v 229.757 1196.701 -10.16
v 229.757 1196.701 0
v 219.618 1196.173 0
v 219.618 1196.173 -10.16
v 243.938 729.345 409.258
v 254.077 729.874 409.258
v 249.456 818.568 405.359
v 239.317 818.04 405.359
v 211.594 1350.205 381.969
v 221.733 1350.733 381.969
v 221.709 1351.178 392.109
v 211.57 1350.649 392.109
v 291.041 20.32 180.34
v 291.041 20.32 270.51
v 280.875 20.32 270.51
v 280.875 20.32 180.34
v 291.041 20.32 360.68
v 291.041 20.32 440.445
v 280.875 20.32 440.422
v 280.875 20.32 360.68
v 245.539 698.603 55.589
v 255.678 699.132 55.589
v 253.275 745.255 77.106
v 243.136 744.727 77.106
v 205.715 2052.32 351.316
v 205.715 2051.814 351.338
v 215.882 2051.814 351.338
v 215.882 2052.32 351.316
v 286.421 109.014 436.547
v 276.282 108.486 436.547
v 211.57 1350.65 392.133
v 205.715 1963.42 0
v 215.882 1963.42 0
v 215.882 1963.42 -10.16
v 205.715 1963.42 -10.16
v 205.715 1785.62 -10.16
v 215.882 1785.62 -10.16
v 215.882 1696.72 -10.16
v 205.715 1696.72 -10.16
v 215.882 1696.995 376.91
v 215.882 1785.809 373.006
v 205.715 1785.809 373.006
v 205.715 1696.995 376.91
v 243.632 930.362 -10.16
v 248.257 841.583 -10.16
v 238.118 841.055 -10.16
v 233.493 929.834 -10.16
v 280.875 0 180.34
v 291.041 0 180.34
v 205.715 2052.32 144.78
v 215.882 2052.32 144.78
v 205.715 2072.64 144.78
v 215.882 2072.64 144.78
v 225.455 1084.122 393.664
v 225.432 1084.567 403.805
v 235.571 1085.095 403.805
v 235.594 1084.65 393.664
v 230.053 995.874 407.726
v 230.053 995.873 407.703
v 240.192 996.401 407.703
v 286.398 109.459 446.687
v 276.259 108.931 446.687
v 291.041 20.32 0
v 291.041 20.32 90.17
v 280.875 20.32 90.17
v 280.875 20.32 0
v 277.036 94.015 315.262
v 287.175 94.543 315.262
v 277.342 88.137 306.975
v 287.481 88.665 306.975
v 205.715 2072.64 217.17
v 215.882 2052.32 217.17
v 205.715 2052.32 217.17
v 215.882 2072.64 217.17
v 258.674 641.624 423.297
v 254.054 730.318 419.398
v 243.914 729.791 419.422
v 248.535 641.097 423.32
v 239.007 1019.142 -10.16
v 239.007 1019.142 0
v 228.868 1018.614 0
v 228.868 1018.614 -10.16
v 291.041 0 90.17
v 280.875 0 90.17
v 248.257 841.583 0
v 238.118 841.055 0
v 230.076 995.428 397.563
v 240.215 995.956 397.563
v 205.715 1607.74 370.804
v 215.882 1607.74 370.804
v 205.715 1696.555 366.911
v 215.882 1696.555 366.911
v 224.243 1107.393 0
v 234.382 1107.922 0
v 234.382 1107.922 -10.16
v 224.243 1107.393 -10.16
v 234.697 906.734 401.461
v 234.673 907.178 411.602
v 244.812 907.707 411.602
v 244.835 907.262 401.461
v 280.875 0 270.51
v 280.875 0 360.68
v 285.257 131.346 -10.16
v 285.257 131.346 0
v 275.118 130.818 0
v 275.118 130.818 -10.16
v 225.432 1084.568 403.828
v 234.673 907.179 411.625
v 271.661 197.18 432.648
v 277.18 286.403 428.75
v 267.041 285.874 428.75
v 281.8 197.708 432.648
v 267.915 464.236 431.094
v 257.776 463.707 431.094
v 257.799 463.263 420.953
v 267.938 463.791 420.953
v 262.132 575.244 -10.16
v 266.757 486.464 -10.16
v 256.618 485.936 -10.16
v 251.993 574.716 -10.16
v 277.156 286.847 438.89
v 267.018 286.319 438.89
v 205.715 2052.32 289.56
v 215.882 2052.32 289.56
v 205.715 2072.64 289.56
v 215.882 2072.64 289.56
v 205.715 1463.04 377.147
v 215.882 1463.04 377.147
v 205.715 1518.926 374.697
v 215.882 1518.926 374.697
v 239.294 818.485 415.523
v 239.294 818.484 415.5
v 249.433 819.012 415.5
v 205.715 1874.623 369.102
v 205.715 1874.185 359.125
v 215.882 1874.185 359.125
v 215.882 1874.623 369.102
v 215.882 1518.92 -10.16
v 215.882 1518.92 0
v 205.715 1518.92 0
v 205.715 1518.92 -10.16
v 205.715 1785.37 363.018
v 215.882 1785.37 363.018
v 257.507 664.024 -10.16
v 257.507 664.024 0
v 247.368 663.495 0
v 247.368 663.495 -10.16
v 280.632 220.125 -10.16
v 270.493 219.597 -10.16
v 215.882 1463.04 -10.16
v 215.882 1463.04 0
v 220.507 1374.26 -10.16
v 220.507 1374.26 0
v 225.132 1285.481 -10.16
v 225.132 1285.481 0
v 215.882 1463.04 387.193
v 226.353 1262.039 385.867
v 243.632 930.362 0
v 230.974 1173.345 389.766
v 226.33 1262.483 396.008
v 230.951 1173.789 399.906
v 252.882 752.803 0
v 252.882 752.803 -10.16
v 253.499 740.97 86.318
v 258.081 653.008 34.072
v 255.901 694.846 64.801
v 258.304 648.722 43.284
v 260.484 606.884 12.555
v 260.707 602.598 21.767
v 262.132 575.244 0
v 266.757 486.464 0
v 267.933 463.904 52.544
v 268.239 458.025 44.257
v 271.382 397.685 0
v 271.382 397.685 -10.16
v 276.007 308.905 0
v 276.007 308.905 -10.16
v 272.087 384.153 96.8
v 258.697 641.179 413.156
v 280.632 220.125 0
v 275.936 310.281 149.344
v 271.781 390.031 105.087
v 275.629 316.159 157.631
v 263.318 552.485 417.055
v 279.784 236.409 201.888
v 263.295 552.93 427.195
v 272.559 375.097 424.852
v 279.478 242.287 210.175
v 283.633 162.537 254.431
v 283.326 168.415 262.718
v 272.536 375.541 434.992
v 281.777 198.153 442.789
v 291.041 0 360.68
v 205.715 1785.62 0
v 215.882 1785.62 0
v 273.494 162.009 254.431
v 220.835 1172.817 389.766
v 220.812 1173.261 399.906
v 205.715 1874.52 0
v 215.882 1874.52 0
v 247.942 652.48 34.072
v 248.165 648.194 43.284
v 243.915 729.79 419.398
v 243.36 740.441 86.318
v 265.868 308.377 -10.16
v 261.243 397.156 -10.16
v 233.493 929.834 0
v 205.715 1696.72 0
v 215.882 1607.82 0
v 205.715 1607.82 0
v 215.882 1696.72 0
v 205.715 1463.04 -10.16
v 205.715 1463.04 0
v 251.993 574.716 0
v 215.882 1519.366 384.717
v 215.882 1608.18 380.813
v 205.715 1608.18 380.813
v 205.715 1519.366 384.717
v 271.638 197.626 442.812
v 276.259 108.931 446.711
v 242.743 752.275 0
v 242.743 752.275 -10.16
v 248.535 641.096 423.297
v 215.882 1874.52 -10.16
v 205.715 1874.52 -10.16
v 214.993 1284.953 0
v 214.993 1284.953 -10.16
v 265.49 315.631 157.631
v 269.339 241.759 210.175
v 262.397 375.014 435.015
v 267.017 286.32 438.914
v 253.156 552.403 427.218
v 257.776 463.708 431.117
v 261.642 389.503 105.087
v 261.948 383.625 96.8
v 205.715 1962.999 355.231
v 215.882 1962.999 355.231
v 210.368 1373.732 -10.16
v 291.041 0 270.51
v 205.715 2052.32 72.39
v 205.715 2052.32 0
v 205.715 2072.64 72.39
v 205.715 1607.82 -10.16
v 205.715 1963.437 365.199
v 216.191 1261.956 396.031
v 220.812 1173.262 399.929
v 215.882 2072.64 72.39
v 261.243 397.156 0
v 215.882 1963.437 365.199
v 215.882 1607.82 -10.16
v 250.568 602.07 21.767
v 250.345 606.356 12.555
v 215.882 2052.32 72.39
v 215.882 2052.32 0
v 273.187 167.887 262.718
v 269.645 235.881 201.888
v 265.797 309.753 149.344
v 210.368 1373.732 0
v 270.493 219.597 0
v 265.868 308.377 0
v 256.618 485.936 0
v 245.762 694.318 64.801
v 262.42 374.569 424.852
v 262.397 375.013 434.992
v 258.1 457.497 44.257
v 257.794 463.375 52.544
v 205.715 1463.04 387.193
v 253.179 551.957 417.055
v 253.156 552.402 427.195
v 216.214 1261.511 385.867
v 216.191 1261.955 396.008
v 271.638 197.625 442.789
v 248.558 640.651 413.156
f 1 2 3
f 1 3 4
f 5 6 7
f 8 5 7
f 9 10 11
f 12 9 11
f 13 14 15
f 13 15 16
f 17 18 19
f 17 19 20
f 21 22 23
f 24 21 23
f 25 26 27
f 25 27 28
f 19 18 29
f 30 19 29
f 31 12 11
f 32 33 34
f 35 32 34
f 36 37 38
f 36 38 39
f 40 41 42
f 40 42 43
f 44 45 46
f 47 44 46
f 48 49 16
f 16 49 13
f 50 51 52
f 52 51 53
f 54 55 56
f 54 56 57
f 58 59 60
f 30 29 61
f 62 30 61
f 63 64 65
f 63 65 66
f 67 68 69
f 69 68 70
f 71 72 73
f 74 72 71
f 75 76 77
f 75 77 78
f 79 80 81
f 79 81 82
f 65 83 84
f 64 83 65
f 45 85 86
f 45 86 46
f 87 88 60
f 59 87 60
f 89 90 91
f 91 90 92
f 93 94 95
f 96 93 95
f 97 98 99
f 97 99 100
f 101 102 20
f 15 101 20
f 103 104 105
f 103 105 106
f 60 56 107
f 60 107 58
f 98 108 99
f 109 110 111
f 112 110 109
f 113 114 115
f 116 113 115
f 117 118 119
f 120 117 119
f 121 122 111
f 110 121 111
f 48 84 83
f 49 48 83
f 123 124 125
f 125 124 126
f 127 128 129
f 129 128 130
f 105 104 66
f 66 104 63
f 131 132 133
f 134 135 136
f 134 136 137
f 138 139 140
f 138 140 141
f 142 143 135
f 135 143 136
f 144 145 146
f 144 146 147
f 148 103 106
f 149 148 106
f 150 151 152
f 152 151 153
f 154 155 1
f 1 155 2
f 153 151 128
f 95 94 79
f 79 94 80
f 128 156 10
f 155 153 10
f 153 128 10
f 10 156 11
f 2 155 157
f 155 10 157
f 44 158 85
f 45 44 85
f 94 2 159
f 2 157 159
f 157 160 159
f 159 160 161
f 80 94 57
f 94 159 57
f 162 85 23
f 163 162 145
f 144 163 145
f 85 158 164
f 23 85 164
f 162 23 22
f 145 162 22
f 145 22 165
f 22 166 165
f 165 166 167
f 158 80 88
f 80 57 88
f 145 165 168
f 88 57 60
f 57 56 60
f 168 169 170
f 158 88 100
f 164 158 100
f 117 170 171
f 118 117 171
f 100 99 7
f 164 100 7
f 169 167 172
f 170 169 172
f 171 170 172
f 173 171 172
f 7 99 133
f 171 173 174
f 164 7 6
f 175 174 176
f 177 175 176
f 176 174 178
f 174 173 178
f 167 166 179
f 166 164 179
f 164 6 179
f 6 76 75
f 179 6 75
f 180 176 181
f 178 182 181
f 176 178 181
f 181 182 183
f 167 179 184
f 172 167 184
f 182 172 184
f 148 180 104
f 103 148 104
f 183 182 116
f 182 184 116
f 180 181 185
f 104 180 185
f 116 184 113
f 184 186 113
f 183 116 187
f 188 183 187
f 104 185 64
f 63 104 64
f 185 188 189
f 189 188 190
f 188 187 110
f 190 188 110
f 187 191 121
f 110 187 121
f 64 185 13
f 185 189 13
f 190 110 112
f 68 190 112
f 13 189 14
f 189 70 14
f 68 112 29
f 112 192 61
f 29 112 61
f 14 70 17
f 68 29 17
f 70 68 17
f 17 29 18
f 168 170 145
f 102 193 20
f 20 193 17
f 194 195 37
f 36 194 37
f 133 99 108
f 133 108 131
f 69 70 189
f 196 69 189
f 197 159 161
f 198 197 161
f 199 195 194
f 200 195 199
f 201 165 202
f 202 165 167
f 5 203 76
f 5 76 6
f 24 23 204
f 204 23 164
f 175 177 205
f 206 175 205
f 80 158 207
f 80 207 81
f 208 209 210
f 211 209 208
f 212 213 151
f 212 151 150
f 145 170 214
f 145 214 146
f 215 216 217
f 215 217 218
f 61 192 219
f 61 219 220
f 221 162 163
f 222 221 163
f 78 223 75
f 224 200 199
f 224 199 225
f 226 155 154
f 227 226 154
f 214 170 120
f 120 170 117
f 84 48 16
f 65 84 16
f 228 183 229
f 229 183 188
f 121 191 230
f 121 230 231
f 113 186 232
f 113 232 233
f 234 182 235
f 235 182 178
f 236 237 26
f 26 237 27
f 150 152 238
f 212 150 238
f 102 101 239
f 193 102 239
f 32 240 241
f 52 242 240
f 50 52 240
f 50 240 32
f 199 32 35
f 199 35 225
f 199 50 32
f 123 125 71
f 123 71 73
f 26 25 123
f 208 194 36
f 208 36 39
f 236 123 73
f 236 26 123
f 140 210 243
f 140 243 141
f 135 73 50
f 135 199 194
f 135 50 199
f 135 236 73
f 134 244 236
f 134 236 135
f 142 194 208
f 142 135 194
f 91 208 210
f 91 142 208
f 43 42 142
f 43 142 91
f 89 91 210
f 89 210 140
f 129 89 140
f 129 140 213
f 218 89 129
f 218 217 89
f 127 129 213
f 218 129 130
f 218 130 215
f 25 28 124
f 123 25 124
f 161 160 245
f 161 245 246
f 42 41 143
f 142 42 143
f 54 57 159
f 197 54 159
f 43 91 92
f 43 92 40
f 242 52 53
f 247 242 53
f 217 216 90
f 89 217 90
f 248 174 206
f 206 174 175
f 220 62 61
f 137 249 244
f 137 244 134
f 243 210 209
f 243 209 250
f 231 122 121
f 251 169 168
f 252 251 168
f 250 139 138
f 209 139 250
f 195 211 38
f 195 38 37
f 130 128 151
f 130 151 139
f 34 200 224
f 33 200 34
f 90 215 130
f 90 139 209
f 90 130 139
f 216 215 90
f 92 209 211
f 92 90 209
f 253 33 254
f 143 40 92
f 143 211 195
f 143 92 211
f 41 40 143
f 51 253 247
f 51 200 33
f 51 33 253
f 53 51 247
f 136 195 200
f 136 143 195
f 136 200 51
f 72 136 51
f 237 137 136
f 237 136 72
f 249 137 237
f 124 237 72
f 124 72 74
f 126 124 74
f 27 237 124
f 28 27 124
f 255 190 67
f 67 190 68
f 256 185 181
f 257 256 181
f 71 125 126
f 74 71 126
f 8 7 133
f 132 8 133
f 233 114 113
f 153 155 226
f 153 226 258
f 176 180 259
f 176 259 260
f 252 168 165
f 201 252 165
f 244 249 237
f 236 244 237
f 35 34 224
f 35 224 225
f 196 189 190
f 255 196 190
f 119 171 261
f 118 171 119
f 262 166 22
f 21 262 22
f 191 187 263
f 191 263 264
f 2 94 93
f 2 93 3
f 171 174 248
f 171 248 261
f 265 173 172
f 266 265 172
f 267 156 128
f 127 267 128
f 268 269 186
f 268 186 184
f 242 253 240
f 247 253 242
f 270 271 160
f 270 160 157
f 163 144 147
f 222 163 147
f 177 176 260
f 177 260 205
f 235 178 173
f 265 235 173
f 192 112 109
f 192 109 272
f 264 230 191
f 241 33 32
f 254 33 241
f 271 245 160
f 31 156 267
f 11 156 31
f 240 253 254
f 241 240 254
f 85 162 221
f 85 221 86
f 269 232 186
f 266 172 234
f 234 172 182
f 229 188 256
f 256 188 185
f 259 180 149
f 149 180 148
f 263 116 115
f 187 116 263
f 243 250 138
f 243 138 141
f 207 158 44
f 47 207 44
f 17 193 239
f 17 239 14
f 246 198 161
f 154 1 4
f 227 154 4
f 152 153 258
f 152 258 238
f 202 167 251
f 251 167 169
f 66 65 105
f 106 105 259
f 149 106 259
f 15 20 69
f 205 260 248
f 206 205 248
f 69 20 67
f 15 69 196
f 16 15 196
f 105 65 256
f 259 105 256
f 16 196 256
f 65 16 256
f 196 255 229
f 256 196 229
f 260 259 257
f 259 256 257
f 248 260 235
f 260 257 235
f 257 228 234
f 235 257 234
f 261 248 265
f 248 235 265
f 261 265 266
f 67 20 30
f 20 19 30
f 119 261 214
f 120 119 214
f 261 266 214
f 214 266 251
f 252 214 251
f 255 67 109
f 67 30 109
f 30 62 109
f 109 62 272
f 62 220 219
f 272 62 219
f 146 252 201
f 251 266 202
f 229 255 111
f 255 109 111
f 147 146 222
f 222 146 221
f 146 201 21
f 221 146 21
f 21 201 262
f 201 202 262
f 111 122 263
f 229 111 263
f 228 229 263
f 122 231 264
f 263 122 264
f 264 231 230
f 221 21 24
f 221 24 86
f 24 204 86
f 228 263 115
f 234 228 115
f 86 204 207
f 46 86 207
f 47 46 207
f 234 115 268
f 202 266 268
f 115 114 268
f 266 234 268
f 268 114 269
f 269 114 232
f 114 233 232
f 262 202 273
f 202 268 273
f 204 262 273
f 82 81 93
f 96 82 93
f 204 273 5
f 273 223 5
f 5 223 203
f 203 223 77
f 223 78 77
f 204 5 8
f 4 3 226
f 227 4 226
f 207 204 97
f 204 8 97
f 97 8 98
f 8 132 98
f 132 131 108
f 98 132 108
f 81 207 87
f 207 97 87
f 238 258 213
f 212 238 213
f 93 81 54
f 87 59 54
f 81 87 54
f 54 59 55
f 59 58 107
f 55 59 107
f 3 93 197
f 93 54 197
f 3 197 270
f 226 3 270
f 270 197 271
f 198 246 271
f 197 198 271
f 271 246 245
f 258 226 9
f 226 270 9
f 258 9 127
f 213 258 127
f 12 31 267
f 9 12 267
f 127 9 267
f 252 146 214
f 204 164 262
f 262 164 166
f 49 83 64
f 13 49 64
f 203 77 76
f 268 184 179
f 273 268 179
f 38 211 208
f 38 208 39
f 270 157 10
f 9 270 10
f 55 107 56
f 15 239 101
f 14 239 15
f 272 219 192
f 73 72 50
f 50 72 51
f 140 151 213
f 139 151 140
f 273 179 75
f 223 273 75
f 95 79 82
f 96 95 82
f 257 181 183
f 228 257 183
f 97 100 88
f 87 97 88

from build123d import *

# Parameters (mm, degrees)
SKETCH1_W                = 10.166490401
SKETCH1_H                = 20.32
BOSS_EXTRUDE1_DEPTH      = 450.605251
BOSS_EXTRUDE1_DEPTH_BACK = 10.16
SKETCH2_W                = 40.64
SKETCH2_H                = 88.420284457
CUT_EXTRUDE1_DEPTH       = 1125.982
SKETCH4_W                = 10.16
SKETCH4_H                = 20.292482061
SKETCH4_H_2              = 111.176423169
SKETCH4_H_3              = 88.9
CUT_EXTRUDE2_DEPTH       = 2108.968119463
CUT_EXTRUDE3_REACH       = 2123.564
SKETCH5_W                = 10.16
SKETCH5_H                = 88.9
SKETCH5_H_2              = 55.879999965
SKETCH6_W                = 89.925250809
SKETCH6_H                = 20.32
SKETCH6_W_2              = 90.17
CUT_EXTRUDE4_DEPTH       = 1125.982
SKETCH7_W                = 82.55
SKETCH7_H                = 20.32
SKETCH7_W_2              = 72.39
CUT_EXTRUDE5_DEPTH       = 1125.982
CUT_EXTRUDE6_DEPTH       = 2108.139004111


with BuildPart() as part:
    # Sketch1 → Boss-Extrude1 (new, two sides)
    with BuildSketch(Plane.XY) as boss_extrude1_sk:
        Polygon((291.041413739, 20.32), (280.874923338, 20.32), (205.715298803, 1463.040000035), (205.715298803, 2052.32), (215.881789204, 2052.32), (215.881789204, 1463.040000035), align=None)
        with Locations((285.958168538, 10.16)):
            Rectangle(SKETCH1_W, SKETCH1_H)
        with Locations((210.798544004, 2062.48)):
            Rectangle(SKETCH1_W, SKETCH1_H)
    extrude(amount=BOSS_EXTRUDE1_DEPTH)
    extrude(boss_extrude1_sk.sketch, amount=-BOSS_EXTRUDE1_DEPTH_BACK)

    # Sketch2 → Cut-Extrude1 (cut)
    with BuildSketch(Plane(origin=(605.264675653, -1278.915479685, -1125.851113248), x_dir=(0, -1, 0), z_dir=(-1, 0, 0))):
        Polygon((-3310.915479685, 1576.456364056), (-3310.915479685, 1488.036079599), (-1299.235479685, 1576.456364056), align=None)
        with Locations((-3331.235479685, 1532.246221827)):
            Rectangle(SKETCH2_W, SKETCH2_H)
    extrude(amount=CUT_EXTRUDE1_DEPTH, mode=Mode.SUBTRACT)

    # Sketch4 → Cut-Extrude2 (cut, through all)
    with BuildSketch(Plane(origin=(291.309394939, 15.175990314, 0), x_dir=(0, 0, -1), z_dir=(0.9986457707048434, 0.05202523093009139, 0))):
        with Locations((5.08, -4.99525573)):
            Rectangle(SKETCH4_W, SKETCH4_H)
        with Locations((5.08, 60.739196886)):
            Rectangle(SKETCH4_W, SKETCH4_H_2)
        with Locations((5.08, 249.67740847)):
            Rectangle(SKETCH4_W, SKETCH4_H_3)
        with Locations((5.08, 783.07740847)):
            Rectangle(SKETCH4_W, SKETCH4_H_3)
        with Locations((5.08, 960.87740847)):
            Rectangle(SKETCH4_W, SKETCH4_H_3)
        with Locations((5.08, 1138.67740847)):
            Rectangle(SKETCH4_W, SKETCH4_H_3)
        with Locations((5.08, 1316.47740847)):
            Rectangle(SKETCH4_W, SKETCH4_H_3)
        with Locations((-445.525250809, -4.99525573)):
            Rectangle(SKETCH4_W, SKETCH4_H)
        Polygon((-450.605250809, 5.150985301), (-440.445250809, 5.150985301), (-436.546834031, 93.965468053), (-446.687296633, 94.410572819), align=None)
        Polygon((-411.601545632, 893.740917593), (-401.46108303, 893.295812828), (-397.562666252, 982.11029558), (-407.703128854, 982.555400346), align=None)
        Polygon((-403.804712076, 1071.369883099), (-393.664249474, 1070.924778333), (-389.765832696, 1159.739261086), (-399.906295298, 1160.184365851), align=None)
        Polygon((-396.00787852, 1248.998848604), (-385.867415918, 1248.553743838), (-381.96899914, 1337.368226591), (-392.109461742, 1337.813331357), align=None)
        Polygon((-419.398379188, 716.111952088), (-409.257916585, 715.666847322), (-405.359499808, 804.481330075), (-415.49996241, 804.926434841), align=None)
        Polygon((-455.140613686, 5.150985301), (-450.605250809, 5.150985301), (-446.687296633, 94.410572819), (-450.605250809, 94.410572819), align=None)
        Polygon((-449.818612929, 183.53361819), (-442.788879855, 183.225055572), (-438.890463077, 272.039538325), (-445.920196151, 272.348100943), align=None)
        Polygon((-441.625759495, 361.145200827), (-434.992046299, 360.854021077), (-431.093629521, 449.66850383), (-437.727342717, 449.959683579), align=None)
        Polygon((-434.571427919, 538.806757663), (-427.195212743, 538.482986583), (-423.296795965, 627.297469335), (-430.673011141, 627.621240415), align=None)
        Polygon((-426.54112259, 716.425475174), (-419.398379188, 716.111952088), (-415.49996241, 804.926434841), (-422.642705812, 805.239957927), align=None)
        Polygon((-420.338817864, 894.124430818), (-411.601545632, 893.740917593), (-407.703128854, 982.555400346), (-416.440401086, 982.93891357), align=None)
        Polygon((-415.276210663, 1071.873412266), (-403.804712076, 1071.369883099), (-399.906295298, 1160.184365851), (-411.377793885, 1160.687895019), align=None)
        Polygon((-414.342332906, 1249.80361988), (-396.00787852, 1248.998848604), (-392.109461742, 1337.813331357), (-410.443916128, 1338.618102632), align=None)
        with Locations((5.08, 427.47740847)):
            Rectangle(SKETCH4_W, SKETCH4_H_3)
        with Locations((5.08, 605.27740847)):
            Rectangle(SKETCH4_W, SKETCH4_H_3)
        Polygon((-442.788879855, 183.225055572), (-438.890463077, 272.039538325), (-428.750000475, 271.594433559), (-432.648417253, 182.779950806), align=None)
        Polygon((-434.992046299, 360.854021077), (-431.093629521, 449.66850383), (-420.953166919, 449.223399064), (-424.851583697, 360.408916311), align=None)
        Polygon((-417.054750141, 538.037881817), (-413.156333363, 626.852364569), (-423.296795965, 627.297469335), (-427.195212743, 538.482986583), align=None)
    extrude(amount=-CUT_EXTRUDE2_DEPTH, mode=Mode.SUBTRACT)

    # Cut-Extrude3: up to this face of the body (flat: up to its plane)
    cut_extrude3_end = Plane(part.part.faces().sort_by_distance((205.715298803, 1754.382873748, 182.121056608))[0])
    # Sketch5 → Cut-Extrude3 (cut, up to the picked face)
    with BuildSketch(Plane(origin=(215.881789204, 0, 0), x_dir=(0, 0, -1), z_dir=(1, 0, 0)), mode=Mode.PRIVATE) as cut_extrude3_sk1:
        with Locations((5.08, 2007.87)):
            Rectangle(SKETCH5_W, SKETCH5_H)
    cut_extrude3_tool1 = split(extrude(cut_extrude3_sk1.sketch, amount=-CUT_EXTRUDE3_REACH, mode=Mode.PRIVATE), bisect_by=cut_extrude3_end, keep=Keep.BOTH, mode=Mode.PRIVATE)
    # Sketch5 → Cut-Extrude3 (cut, up to the picked face)
    with BuildSketch(Plane(origin=(215.881789204, 0, 0), x_dir=(0, 0, -1), z_dir=(1, 0, 0)), mode=Mode.PRIVATE) as cut_extrude3_sk2:
        with Locations((5.08, 1830.07)):
            Rectangle(SKETCH5_W, SKETCH5_H)
    cut_extrude3_tool2 = split(extrude(cut_extrude3_sk2.sketch, amount=-CUT_EXTRUDE3_REACH, mode=Mode.PRIVATE), bisect_by=cut_extrude3_end, keep=Keep.BOTH, mode=Mode.PRIVATE)
    # Sketch5 → Cut-Extrude3 (cut, up to the picked face)
    with BuildSketch(Plane(origin=(215.881789204, 0, 0), x_dir=(0, 0, -1), z_dir=(1, 0, 0)), mode=Mode.PRIVATE) as cut_extrude3_sk3:
        with Locations((5.08, 1652.27)):
            Rectangle(SKETCH5_W, SKETCH5_H)
    cut_extrude3_tool3 = split(extrude(cut_extrude3_sk3.sketch, amount=-CUT_EXTRUDE3_REACH, mode=Mode.PRIVATE), bisect_by=cut_extrude3_end, keep=Keep.BOTH, mode=Mode.PRIVATE)
    # Sketch5 → Cut-Extrude3 (cut, up to the picked face)
    with BuildSketch(Plane(origin=(215.881789204, 0, 0), x_dir=(0, 0, -1), z_dir=(1, 0, 0)), mode=Mode.PRIVATE) as cut_extrude3_sk4:
        with Locations((5.08, 1490.980000018)):
            Rectangle(SKETCH5_W, SKETCH5_H_2)
    cut_extrude3_tool4 = split(extrude(cut_extrude3_sk4.sketch, amount=-CUT_EXTRUDE3_REACH, mode=Mode.PRIVATE), bisect_by=cut_extrude3_end, keep=Keep.BOTH, mode=Mode.PRIVATE)
    # Sketch5 → Cut-Extrude3 (cut, up to the picked face)
    with BuildSketch(Plane(origin=(215.881789204, 0, 0), x_dir=(0, 0, -1), z_dir=(1, 0, 0)), mode=Mode.PRIVATE) as cut_extrude3_sk5:
        Polygon((-355.231442512, 1962.99930346), (-351.338294917, 2051.814017969), (-361.488468688, 2052.260153165), (-362.184966352, 2036.370891417), (-362.184966352, 2032), (-365.19852982, 1963.437391374), align=None)
    cut_extrude3_tool5 = split(extrude(cut_extrude3_sk5.sketch, amount=-CUT_EXTRUDE3_REACH, mode=Mode.PRIVATE), bisect_by=cut_extrude3_end, keep=Keep.BOTH, mode=Mode.PRIVATE)
    # Sketch5 → Cut-Extrude3 (cut, up to the picked face)
    with BuildSketch(Plane(origin=(215.881789204, 0, 0), x_dir=(0, 0, -1), z_dir=(1, 0, 0)), mode=Mode.PRIVATE) as cut_extrude3_sk6:
        Polygon((-363.017737701, 1785.369874443), (-359.124590106, 1874.184588952), (-369.102222921, 1874.623140377), (-373.005916021, 1785.80888938), align=None)
    cut_extrude3_tool6 = split(extrude(cut_extrude3_sk6.sketch, amount=-CUT_EXTRUDE3_REACH, mode=Mode.PRIVATE), bisect_by=cut_extrude3_end, keep=Keep.BOTH, mode=Mode.PRIVATE)
    # Sketch5 → Cut-Extrude3 (cut, up to the picked face)
    with BuildSketch(Plane(origin=(215.881789204, 0, 0), x_dir=(0, 0, -1), z_dir=(1, 0, 0)), mode=Mode.PRIVATE) as cut_extrude3_sk7:
        Polygon((-387.19272357, 1463.040000035), (-377.14690292, 1463.040000035), (-374.697180484, 1518.925730918), (-384.716995324, 1519.366136389), align=None)
    cut_extrude3_tool7 = split(extrude(cut_extrude3_sk7.sketch, amount=-CUT_EXTRUDE3_REACH, mode=Mode.PRIVATE), bisect_by=cut_extrude3_end, keep=Keep.BOTH, mode=Mode.PRIVATE)
    # Sketch5 → Cut-Extrude3 (cut, up to the picked face)
    with BuildSketch(Plane(origin=(215.881789204, 0, 0), x_dir=(0, 0, -1), z_dir=(1, 0, 0)), mode=Mode.PRIVATE) as cut_extrude3_sk8:
        Polygon((-370.80403289, 1607.740445426), (-366.910885295, 1696.555159935), (-376.909609122, 1696.994638383), (-380.813302223, 1608.180387386), align=None)
    cut_extrude3_tool8 = split(extrude(cut_extrude3_sk8.sketch, amount=-CUT_EXTRUDE3_REACH, mode=Mode.PRIVATE), bisect_by=cut_extrude3_end, keep=Keep.BOTH, mode=Mode.PRIVATE)
    add(cut_extrude3_tool1.solids().sort_by(Axis((215.881789, 2007.87, -5.08), (-1, 0, 0)))[0], mode=Mode.SUBTRACT)
    add(cut_extrude3_tool2.solids().sort_by(Axis((215.881789, 1830.07, -5.08), (-1, 0, 0)))[0], mode=Mode.SUBTRACT)
    add(cut_extrude3_tool3.solids().sort_by(Axis((215.881789, 1652.27, -5.08), (-1, 0, 0)))[0], mode=Mode.SUBTRACT)
    add(cut_extrude3_tool4.solids().sort_by(Axis((215.881789, 1490.98, -5.08), (-1, 0, 0)))[0], mode=Mode.SUBTRACT)
    add(cut_extrude3_tool5.solids().sort_by(Axis((215.881789, 2007.75713, 358.279909), (-1, 0, 0)))[0], mode=Mode.SUBTRACT)
    add(cut_extrude3_tool6.solids().sort_by(Axis((215.881789, 1829.988805, 366.06296), (-1, 0, 0)))[0], mode=Mode.SUBTRACT)
    add(cut_extrude3_tool7.solids().sort_by(Axis((215.881789, 1491.090003, 380.945152), (-1, 0, 0)))[0], mode=Mode.SUBTRACT)
    add(cut_extrude3_tool8.solids().sort_by(Axis((215.881789, 1652.359856, 373.8598), (-1, 0, 0)))[0], mode=Mode.SUBTRACT)

    # Sketch6 → Cut-Extrude4 (cut)
    with BuildSketch(Plane(origin=(291.041413739, 0, 0), x_dir=(0, 0, -1), z_dir=(1, 0, 0))):
        with Locations((-405.642625404, 10.16)):
            Rectangle(SKETCH6_W, SKETCH6_H)
        with Locations((-225.425, 10.16)):
            Rectangle(SKETCH6_W_2, SKETCH6_H)
        with Locations((-45.085, 10.16)):
            Rectangle(SKETCH6_W_2, SKETCH6_H)
    extrude(amount=-CUT_EXTRUDE4_DEPTH, mode=Mode.SUBTRACT)

    # Sketch7 → Cut-Extrude5 (cut)
    with BuildSketch(Plane(origin=(215.881789204, 0, 0), x_dir=(0, 0, -1), z_dir=(1, 0, 0))):
        with Locations((-31.115, 2062.48)):
            Rectangle(SKETCH7_W, SKETCH7_H)
        with Locations((-180.975, 2062.48)):
            Rectangle(SKETCH7_W_2, SKETCH7_H)
        Polygon((-351.338294917, 2051.814017969), (-351.316115454, 2052.32), (-289.56, 2052.32), (-289.56, 2072.64), (-362.184966352, 2072.64), (-362.184966352, 2036.370891417), (-361.488468688, 2052.260153165), align=None)
    extrude(amount=-CUT_EXTRUDE5_DEPTH, mode=Mode.SUBTRACT)

    # Sketch9 → Cut-Extrude6 (cut, through all)
    with BuildSketch(Plane(origin=(291.309394939, 15.175990314, 0), x_dir=(0, 0, -1), z_dir=(0.9986457707048444, 0.05202523093007474, 0))):
        Polygon((-96.800454295, 369.477574692), (-44.256814481, 443.449817787), (-52.543639813, 449.336079272), (-105.087279627, 375.363836176), align=None)
        Polygon((-201.887733921, 221.533088501), (-149.344094108, 295.505331596), (-157.63091944, 301.39159308), (-210.174559253, 227.419349985), align=None)
        Polygon((-306.975013548, 73.588602309), (-254.431373734, 147.560845405), (-262.718199066, 153.447106889), (-315.26183888, 79.474863794), align=None)
        Polygon((-21.7668071, 588.218839028), (-12.554964696, 592.51040284), (-34.07199968, 638.696721847), (-43.283842083, 634.405158034), align=None)
        Polygon((-55.589034664, 684.883040853), (-77.106069648, 731.069359859), (-86.317912051, 726.777796047), (-64.800877067, 680.591477041), align=None)
    extrude(amount=-CUT_EXTRUDE6_DEPTH, mode=Mode.SUBTRACT)


solid = part.part
